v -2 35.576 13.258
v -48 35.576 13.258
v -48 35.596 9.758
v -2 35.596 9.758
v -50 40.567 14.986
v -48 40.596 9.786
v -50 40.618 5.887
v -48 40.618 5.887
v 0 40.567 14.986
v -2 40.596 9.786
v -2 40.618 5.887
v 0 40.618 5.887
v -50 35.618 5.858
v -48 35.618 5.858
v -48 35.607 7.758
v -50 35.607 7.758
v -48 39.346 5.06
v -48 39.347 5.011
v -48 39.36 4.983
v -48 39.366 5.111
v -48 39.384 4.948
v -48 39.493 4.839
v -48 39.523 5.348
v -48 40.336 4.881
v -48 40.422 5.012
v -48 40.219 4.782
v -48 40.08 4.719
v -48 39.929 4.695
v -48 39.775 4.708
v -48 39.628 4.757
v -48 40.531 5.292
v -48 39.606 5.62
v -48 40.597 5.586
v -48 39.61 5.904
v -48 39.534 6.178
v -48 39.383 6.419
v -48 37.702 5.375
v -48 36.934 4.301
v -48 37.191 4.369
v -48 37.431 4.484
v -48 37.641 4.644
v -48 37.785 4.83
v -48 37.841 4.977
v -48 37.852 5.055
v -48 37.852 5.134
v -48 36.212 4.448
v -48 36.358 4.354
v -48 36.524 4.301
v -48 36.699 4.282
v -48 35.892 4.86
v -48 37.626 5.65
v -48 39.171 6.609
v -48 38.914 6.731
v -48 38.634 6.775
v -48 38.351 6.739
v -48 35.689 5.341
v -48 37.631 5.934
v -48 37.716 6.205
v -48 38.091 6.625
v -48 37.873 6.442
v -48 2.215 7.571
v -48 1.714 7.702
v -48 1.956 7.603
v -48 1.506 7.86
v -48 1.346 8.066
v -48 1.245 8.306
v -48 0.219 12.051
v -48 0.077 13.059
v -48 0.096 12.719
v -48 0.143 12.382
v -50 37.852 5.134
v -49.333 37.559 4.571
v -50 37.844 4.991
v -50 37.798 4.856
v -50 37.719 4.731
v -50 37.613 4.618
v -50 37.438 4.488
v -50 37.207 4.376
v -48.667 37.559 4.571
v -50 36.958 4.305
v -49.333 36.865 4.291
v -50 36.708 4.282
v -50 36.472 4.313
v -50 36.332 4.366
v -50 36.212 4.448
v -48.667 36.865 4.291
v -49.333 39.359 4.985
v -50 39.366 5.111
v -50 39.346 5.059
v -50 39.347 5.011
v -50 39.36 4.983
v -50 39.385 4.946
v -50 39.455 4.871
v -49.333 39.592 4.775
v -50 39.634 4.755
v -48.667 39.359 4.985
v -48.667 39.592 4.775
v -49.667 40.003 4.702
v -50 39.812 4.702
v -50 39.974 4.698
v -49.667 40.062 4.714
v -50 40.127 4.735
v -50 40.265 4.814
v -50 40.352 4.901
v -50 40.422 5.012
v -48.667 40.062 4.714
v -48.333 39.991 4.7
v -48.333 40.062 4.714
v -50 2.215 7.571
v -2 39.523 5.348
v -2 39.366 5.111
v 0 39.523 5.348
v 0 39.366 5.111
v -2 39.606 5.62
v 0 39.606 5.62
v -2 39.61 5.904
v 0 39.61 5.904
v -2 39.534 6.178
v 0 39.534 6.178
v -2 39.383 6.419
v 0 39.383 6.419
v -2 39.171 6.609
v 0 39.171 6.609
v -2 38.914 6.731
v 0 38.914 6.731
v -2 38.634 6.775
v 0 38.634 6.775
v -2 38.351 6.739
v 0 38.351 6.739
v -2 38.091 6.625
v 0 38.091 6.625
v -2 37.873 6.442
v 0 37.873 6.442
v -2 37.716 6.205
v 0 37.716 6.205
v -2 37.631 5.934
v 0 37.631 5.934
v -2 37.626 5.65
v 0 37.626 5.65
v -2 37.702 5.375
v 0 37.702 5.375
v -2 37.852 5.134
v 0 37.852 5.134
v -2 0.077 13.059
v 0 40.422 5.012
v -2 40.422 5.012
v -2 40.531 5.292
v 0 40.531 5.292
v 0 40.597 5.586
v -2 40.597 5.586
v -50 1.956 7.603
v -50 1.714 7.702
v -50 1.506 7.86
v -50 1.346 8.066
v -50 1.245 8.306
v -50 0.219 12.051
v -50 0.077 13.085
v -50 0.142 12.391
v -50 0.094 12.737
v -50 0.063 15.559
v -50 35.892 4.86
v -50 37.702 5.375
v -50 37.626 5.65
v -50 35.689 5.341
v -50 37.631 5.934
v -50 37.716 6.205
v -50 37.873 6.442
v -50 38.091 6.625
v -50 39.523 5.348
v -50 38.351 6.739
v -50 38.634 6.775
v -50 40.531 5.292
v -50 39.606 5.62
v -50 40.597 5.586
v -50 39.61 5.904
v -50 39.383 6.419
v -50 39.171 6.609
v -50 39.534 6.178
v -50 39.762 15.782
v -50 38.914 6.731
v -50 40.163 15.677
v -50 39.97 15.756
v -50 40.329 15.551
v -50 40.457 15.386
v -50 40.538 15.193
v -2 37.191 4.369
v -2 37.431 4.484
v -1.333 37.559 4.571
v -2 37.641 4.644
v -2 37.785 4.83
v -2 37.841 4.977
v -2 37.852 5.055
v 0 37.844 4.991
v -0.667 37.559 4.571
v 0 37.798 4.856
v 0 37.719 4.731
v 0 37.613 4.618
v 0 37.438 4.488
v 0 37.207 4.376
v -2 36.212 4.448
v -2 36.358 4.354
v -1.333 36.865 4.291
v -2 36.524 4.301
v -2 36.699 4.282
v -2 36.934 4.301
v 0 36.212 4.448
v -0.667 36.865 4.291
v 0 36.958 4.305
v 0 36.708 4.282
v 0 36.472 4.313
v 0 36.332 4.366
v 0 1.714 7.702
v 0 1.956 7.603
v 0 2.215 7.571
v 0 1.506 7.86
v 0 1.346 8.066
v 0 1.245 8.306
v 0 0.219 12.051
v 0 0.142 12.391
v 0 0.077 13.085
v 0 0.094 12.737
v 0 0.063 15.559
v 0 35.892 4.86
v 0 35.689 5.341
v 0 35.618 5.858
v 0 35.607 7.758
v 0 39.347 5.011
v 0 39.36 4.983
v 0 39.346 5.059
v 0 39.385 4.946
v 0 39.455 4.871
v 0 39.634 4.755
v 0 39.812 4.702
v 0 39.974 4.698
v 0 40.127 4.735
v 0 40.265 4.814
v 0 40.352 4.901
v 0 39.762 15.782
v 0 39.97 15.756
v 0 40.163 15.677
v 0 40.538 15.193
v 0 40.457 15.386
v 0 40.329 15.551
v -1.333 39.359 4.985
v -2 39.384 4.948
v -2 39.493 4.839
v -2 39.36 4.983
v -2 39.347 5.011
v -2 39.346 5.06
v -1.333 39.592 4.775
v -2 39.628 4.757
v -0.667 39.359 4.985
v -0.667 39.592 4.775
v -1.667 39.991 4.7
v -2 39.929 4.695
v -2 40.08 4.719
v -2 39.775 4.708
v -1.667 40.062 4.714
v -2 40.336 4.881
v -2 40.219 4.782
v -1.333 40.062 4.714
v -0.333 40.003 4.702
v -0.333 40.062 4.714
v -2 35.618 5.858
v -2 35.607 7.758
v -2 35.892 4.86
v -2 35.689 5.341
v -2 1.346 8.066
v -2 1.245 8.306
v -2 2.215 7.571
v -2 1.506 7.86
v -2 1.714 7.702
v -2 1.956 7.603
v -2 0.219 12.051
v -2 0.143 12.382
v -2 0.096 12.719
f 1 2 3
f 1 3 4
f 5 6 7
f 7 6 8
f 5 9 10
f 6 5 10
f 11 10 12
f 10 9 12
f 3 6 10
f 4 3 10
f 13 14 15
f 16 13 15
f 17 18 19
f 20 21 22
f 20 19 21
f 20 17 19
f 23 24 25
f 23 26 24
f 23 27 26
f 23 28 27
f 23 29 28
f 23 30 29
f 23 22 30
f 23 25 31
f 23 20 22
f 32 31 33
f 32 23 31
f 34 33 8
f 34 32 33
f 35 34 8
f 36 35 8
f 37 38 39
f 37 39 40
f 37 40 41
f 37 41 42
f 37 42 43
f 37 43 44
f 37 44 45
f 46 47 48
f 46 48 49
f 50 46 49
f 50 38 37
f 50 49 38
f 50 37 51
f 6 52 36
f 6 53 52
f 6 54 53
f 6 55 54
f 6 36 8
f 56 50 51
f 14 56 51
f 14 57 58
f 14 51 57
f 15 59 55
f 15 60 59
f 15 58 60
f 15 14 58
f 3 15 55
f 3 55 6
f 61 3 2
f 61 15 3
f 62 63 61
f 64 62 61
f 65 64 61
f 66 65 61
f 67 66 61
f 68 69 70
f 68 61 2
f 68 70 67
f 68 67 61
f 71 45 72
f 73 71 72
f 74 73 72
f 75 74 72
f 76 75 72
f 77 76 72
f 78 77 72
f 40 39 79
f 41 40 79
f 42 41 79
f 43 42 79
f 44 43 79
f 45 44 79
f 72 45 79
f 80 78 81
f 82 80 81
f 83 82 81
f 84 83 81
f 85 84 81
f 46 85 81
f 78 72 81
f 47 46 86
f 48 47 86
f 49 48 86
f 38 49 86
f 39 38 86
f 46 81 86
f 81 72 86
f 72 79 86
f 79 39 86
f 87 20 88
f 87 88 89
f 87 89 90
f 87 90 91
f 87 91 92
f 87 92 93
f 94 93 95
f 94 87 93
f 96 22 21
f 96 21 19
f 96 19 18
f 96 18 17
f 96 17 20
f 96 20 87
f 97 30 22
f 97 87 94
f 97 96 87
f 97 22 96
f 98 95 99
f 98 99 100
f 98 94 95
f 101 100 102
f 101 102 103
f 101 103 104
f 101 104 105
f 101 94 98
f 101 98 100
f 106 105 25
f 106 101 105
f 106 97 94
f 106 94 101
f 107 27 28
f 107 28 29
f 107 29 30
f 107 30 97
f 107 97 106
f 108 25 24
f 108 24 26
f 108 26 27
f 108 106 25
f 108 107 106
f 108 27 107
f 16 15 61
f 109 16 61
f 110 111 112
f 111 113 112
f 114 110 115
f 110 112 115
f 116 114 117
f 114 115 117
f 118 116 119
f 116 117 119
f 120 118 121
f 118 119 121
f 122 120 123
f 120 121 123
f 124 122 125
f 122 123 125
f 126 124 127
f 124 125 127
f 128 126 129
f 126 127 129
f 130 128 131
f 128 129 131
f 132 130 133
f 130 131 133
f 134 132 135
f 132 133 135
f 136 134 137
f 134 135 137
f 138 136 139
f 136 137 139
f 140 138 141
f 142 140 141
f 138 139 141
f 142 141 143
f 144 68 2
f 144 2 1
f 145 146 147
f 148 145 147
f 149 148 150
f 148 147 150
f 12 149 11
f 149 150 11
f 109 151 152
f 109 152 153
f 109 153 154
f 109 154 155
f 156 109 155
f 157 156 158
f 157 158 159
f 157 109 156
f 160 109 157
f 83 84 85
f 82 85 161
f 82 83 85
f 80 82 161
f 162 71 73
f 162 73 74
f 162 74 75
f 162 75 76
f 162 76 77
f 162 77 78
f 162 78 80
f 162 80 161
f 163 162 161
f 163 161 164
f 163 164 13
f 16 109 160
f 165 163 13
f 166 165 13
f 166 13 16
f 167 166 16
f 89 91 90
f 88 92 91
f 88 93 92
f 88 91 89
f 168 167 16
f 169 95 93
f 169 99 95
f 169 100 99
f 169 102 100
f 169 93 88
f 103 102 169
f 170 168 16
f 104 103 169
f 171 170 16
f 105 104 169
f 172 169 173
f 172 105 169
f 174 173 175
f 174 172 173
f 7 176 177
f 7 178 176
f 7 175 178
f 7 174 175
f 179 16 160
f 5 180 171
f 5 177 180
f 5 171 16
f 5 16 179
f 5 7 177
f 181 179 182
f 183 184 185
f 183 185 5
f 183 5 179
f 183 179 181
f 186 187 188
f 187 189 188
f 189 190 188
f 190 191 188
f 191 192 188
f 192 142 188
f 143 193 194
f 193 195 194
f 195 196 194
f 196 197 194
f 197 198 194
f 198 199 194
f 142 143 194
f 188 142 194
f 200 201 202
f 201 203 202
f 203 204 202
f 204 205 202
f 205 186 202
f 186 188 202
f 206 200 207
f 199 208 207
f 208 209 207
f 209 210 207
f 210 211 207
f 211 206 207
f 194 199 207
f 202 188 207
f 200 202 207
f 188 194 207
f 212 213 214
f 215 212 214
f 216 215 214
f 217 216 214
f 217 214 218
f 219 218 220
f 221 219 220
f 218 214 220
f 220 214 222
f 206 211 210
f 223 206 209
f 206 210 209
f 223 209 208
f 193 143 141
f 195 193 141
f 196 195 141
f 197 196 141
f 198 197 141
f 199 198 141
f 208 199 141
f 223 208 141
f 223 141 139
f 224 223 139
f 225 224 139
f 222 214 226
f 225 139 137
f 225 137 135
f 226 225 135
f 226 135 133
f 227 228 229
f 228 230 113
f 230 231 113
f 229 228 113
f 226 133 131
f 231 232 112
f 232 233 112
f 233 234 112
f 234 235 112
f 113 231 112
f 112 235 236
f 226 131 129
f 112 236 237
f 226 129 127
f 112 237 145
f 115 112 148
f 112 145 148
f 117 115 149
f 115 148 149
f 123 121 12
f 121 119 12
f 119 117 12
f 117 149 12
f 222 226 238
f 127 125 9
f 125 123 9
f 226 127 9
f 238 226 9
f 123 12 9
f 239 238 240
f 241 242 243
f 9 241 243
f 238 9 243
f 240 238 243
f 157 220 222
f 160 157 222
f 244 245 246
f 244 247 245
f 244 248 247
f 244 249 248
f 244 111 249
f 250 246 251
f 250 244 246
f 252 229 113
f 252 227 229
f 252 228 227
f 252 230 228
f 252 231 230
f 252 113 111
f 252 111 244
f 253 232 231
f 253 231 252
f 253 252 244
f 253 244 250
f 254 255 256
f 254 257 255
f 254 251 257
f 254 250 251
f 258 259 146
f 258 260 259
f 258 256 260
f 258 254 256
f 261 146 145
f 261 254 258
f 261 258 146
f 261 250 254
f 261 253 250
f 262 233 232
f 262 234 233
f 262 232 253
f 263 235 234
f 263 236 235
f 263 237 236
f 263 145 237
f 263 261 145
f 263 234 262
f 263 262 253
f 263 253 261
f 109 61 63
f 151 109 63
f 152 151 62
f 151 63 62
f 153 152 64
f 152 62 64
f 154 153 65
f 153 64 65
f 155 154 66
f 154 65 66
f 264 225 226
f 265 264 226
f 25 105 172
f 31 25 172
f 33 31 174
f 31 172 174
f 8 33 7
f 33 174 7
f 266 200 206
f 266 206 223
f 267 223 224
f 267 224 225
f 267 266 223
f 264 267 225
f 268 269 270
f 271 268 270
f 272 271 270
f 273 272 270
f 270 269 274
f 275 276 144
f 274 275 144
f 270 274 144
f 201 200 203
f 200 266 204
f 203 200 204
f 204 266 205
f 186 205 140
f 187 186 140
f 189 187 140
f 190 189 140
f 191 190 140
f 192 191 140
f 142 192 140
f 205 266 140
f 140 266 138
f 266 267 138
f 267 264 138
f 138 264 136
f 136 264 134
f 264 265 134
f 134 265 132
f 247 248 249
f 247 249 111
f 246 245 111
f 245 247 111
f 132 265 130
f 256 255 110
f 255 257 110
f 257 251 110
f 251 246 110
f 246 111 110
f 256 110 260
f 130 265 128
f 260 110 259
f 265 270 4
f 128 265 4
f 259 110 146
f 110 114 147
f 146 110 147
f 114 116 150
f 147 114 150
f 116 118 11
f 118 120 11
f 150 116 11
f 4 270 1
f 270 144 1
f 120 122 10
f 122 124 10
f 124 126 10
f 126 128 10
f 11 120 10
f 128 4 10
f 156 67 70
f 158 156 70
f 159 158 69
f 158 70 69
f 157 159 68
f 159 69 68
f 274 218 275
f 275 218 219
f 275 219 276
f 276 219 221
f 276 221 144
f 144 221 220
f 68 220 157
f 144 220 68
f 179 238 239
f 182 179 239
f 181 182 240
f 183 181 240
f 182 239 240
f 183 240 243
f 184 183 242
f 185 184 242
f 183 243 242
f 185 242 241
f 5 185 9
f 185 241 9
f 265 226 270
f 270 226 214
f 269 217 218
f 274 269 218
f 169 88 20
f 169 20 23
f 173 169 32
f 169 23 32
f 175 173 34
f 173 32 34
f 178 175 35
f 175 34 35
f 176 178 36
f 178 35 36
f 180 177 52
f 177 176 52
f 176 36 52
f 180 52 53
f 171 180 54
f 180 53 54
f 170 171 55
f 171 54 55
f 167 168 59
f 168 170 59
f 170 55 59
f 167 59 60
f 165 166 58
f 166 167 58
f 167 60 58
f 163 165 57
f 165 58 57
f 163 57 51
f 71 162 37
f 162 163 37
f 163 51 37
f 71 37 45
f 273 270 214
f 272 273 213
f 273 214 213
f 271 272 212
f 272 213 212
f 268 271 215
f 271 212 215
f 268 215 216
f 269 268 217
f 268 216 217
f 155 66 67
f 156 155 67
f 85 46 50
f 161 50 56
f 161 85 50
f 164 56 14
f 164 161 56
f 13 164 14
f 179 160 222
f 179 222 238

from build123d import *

# Parameters (mm, degrees)
BOSS_EXTRUDE1_DEPTH = 50
FILLET5_R           = 2
SKETCH5_W           = 46
SKETCH5_H           = 5.5
CUT_EXTRUDE1_DEPTH  = 35.5
SKETCH6_R           = 1
CUT_EXTRUDE2_DEPTH  = 50
FILLET8_R           = 2
CUT_EXTRUDE3_DEPTH  = 50
CUT_EXTRUDE4_REACH  = 73.453
CUT_EXTRUDE4_START  = -6
SKETCH9_W           = 46
SKETCH9_H           = 5.08594255


with BuildPart() as part:
    # Sketch1 → Boss-Extrude1 (new body)
    with BuildSketch(Plane(origin=(0, 0, 0), x_dir=(0, 0, -1), z_dir=(1, 0, 0))):
        with BuildLine():
            Line((-3.886543853, 40.629191905), (-3.858449328, 35.629270836))
            Line((-3.858449328, 35.629270836), (-7.758387762, 35.607357106))
            Line((-7.758387762, 35.607357106), (-7.570756078, 2.214957203))
            ThreePointArc((-7.570756078, 2.214957203), (-7.773978903, 1.605044256), (-8.306497887, 1.244882))
            Line((-8.306497887, 1.244882), (-12.050945383, 0.218975681))
            ThreePointArc((-12.050945383, 0.218975681), (-12.563535137, 0.11401769), (-13.085439382, 0.076864019))
            Line((-13.085439382, 0.076864019), (-15.558790346, 0.062966276))
            Line((-15.558790346, 0.062966276), (-15.781860873, 39.762339565))
            ThreePointArc((-15.781860873, 39.762339565), (-15.55072853, 40.329332651), (-14.986368626, 40.56682206))
            Line((-14.986368626, 40.56682206), (-3.886543853, 40.629191905))
        make_face()
    extrude(amount=-BOSS_EXTRUDE1_DEPTH)

    # Fillet5
    fillet5_edges = [part.edges().sort_by_distance(p)[0] for p in [
        (-25, 35.629270836, 3.858449328),
    ]]
    fillet(fillet5_edges, radius=FILLET5_R)

    # Sketch5 → Cut-Extrude1 (cut)
    with BuildSketch(Plane(origin=(0, 0.150386272, 0.00084502), x_dir=(1, 0, 0), z_dir=(0, -0.9999842138288617, -0.005618904971023238))):
        with Locations((-25, 10.308190931)):
            Rectangle(SKETCH5_W, SKETCH5_H)
    extrude(amount=-CUT_EXTRUDE1_DEPTH, mode=Mode.SUBTRACT)

    # Sketch6 → Cut-Extrude2 (cut)
    with BuildSketch(Plane(origin=(0, 0, 0), x_dir=(0, 0, -1), z_dir=(1, 0, 0))):
        with Locations((-5.775276049, 38.618547558)):
            Circle(SKETCH6_R)
    extrude(amount=-CUT_EXTRUDE2_DEPTH, mode=Mode.SUBTRACT)

    # Fillet8
    fillet8_edges = [part.edges().sort_by_distance(p)[0] for p in [
        (-25, 40.629191905, 3.886543853),
    ]]
    fillet(fillet8_edges, radius=FILLET8_R)

    # Sketch7 → Cut-Extrude3 (cut)
    with BuildSketch(Plane(origin=(0, 0, 0), x_dir=(0, 0, -1), z_dir=(1, 0, 0))):
        with BuildLine():
            Line((-5.546917351, 39.592124625), (-5.546917351, 37.644970491))
            add(Edge.make_bspline(
                [(-5.546917351, 37.644970491), (-4.707853676, 38.427857511), (-3.932802052, 36.795264926), (-4.447517997, 36.211756548)],
                knots=[0, 0, 0, 0, 1, 1, 1, 1], degree=3))
            Line((-4.447517997, 36.211756548), (-3.72986133, 36.211756548))
            Line((-3.72986133, 36.211756548), (-3.72986133, 40.421981197))
            Line((-3.72986133, 40.421981197), (-5.011793069, 40.421981197))
            add(Edge.make_bspline(
                [(-5.272048409, 39.482701446), (-5.081010169, 39.321292536), (-4.954269224, 39.348440279), (-4.587478606, 39.771100718), (-4.694245253, 40.267694009), (-5.011793069, 40.421981197)],
                knots=[0, 0, 0, 0, 0.130864933, 0.344471665, 1, 1, 1, 1], degree=3))
            add(Edge.make_bspline(
                [(-5.546917351, 39.592124625), (-5.444164643, 39.566706147), (-5.272048409, 39.482701446)],
                knots=[0, 0, 0, 1, 1, 1], degree=2))
        make_face()
    extrude(amount=-CUT_EXTRUDE3_DEPTH, mode=Mode.SUBTRACT)

    # Sketch9 → Cut-Extrude4 (cut, up to next)
    with BuildSketch(Plane(origin=(0, -0.087419996, 15.557945326), x_dir=(1, 0, 0), z_dir=(0, -0.00561890497102722, 0.9999842138288618)).offset(CUT_EXTRUDE4_START), mode=Mode.PRIVATE) as cut_extrude4_sk1:
        with Locations((-25, 38.193359921)):
            Rectangle(SKETCH9_W, SKETCH9_H)
    cut_extrude4_tool1 = extrude(cut_extrude4_sk1.sketch, amount=-CUT_EXTRUDE4_REACH, mode=Mode.PRIVATE) & part.part
    add(cut_extrude4_tool1.solids().sort_by_distance((-25, 38.13905, 9.772645))[0], mode=Mode.SUBTRACT)


solid = part.part
